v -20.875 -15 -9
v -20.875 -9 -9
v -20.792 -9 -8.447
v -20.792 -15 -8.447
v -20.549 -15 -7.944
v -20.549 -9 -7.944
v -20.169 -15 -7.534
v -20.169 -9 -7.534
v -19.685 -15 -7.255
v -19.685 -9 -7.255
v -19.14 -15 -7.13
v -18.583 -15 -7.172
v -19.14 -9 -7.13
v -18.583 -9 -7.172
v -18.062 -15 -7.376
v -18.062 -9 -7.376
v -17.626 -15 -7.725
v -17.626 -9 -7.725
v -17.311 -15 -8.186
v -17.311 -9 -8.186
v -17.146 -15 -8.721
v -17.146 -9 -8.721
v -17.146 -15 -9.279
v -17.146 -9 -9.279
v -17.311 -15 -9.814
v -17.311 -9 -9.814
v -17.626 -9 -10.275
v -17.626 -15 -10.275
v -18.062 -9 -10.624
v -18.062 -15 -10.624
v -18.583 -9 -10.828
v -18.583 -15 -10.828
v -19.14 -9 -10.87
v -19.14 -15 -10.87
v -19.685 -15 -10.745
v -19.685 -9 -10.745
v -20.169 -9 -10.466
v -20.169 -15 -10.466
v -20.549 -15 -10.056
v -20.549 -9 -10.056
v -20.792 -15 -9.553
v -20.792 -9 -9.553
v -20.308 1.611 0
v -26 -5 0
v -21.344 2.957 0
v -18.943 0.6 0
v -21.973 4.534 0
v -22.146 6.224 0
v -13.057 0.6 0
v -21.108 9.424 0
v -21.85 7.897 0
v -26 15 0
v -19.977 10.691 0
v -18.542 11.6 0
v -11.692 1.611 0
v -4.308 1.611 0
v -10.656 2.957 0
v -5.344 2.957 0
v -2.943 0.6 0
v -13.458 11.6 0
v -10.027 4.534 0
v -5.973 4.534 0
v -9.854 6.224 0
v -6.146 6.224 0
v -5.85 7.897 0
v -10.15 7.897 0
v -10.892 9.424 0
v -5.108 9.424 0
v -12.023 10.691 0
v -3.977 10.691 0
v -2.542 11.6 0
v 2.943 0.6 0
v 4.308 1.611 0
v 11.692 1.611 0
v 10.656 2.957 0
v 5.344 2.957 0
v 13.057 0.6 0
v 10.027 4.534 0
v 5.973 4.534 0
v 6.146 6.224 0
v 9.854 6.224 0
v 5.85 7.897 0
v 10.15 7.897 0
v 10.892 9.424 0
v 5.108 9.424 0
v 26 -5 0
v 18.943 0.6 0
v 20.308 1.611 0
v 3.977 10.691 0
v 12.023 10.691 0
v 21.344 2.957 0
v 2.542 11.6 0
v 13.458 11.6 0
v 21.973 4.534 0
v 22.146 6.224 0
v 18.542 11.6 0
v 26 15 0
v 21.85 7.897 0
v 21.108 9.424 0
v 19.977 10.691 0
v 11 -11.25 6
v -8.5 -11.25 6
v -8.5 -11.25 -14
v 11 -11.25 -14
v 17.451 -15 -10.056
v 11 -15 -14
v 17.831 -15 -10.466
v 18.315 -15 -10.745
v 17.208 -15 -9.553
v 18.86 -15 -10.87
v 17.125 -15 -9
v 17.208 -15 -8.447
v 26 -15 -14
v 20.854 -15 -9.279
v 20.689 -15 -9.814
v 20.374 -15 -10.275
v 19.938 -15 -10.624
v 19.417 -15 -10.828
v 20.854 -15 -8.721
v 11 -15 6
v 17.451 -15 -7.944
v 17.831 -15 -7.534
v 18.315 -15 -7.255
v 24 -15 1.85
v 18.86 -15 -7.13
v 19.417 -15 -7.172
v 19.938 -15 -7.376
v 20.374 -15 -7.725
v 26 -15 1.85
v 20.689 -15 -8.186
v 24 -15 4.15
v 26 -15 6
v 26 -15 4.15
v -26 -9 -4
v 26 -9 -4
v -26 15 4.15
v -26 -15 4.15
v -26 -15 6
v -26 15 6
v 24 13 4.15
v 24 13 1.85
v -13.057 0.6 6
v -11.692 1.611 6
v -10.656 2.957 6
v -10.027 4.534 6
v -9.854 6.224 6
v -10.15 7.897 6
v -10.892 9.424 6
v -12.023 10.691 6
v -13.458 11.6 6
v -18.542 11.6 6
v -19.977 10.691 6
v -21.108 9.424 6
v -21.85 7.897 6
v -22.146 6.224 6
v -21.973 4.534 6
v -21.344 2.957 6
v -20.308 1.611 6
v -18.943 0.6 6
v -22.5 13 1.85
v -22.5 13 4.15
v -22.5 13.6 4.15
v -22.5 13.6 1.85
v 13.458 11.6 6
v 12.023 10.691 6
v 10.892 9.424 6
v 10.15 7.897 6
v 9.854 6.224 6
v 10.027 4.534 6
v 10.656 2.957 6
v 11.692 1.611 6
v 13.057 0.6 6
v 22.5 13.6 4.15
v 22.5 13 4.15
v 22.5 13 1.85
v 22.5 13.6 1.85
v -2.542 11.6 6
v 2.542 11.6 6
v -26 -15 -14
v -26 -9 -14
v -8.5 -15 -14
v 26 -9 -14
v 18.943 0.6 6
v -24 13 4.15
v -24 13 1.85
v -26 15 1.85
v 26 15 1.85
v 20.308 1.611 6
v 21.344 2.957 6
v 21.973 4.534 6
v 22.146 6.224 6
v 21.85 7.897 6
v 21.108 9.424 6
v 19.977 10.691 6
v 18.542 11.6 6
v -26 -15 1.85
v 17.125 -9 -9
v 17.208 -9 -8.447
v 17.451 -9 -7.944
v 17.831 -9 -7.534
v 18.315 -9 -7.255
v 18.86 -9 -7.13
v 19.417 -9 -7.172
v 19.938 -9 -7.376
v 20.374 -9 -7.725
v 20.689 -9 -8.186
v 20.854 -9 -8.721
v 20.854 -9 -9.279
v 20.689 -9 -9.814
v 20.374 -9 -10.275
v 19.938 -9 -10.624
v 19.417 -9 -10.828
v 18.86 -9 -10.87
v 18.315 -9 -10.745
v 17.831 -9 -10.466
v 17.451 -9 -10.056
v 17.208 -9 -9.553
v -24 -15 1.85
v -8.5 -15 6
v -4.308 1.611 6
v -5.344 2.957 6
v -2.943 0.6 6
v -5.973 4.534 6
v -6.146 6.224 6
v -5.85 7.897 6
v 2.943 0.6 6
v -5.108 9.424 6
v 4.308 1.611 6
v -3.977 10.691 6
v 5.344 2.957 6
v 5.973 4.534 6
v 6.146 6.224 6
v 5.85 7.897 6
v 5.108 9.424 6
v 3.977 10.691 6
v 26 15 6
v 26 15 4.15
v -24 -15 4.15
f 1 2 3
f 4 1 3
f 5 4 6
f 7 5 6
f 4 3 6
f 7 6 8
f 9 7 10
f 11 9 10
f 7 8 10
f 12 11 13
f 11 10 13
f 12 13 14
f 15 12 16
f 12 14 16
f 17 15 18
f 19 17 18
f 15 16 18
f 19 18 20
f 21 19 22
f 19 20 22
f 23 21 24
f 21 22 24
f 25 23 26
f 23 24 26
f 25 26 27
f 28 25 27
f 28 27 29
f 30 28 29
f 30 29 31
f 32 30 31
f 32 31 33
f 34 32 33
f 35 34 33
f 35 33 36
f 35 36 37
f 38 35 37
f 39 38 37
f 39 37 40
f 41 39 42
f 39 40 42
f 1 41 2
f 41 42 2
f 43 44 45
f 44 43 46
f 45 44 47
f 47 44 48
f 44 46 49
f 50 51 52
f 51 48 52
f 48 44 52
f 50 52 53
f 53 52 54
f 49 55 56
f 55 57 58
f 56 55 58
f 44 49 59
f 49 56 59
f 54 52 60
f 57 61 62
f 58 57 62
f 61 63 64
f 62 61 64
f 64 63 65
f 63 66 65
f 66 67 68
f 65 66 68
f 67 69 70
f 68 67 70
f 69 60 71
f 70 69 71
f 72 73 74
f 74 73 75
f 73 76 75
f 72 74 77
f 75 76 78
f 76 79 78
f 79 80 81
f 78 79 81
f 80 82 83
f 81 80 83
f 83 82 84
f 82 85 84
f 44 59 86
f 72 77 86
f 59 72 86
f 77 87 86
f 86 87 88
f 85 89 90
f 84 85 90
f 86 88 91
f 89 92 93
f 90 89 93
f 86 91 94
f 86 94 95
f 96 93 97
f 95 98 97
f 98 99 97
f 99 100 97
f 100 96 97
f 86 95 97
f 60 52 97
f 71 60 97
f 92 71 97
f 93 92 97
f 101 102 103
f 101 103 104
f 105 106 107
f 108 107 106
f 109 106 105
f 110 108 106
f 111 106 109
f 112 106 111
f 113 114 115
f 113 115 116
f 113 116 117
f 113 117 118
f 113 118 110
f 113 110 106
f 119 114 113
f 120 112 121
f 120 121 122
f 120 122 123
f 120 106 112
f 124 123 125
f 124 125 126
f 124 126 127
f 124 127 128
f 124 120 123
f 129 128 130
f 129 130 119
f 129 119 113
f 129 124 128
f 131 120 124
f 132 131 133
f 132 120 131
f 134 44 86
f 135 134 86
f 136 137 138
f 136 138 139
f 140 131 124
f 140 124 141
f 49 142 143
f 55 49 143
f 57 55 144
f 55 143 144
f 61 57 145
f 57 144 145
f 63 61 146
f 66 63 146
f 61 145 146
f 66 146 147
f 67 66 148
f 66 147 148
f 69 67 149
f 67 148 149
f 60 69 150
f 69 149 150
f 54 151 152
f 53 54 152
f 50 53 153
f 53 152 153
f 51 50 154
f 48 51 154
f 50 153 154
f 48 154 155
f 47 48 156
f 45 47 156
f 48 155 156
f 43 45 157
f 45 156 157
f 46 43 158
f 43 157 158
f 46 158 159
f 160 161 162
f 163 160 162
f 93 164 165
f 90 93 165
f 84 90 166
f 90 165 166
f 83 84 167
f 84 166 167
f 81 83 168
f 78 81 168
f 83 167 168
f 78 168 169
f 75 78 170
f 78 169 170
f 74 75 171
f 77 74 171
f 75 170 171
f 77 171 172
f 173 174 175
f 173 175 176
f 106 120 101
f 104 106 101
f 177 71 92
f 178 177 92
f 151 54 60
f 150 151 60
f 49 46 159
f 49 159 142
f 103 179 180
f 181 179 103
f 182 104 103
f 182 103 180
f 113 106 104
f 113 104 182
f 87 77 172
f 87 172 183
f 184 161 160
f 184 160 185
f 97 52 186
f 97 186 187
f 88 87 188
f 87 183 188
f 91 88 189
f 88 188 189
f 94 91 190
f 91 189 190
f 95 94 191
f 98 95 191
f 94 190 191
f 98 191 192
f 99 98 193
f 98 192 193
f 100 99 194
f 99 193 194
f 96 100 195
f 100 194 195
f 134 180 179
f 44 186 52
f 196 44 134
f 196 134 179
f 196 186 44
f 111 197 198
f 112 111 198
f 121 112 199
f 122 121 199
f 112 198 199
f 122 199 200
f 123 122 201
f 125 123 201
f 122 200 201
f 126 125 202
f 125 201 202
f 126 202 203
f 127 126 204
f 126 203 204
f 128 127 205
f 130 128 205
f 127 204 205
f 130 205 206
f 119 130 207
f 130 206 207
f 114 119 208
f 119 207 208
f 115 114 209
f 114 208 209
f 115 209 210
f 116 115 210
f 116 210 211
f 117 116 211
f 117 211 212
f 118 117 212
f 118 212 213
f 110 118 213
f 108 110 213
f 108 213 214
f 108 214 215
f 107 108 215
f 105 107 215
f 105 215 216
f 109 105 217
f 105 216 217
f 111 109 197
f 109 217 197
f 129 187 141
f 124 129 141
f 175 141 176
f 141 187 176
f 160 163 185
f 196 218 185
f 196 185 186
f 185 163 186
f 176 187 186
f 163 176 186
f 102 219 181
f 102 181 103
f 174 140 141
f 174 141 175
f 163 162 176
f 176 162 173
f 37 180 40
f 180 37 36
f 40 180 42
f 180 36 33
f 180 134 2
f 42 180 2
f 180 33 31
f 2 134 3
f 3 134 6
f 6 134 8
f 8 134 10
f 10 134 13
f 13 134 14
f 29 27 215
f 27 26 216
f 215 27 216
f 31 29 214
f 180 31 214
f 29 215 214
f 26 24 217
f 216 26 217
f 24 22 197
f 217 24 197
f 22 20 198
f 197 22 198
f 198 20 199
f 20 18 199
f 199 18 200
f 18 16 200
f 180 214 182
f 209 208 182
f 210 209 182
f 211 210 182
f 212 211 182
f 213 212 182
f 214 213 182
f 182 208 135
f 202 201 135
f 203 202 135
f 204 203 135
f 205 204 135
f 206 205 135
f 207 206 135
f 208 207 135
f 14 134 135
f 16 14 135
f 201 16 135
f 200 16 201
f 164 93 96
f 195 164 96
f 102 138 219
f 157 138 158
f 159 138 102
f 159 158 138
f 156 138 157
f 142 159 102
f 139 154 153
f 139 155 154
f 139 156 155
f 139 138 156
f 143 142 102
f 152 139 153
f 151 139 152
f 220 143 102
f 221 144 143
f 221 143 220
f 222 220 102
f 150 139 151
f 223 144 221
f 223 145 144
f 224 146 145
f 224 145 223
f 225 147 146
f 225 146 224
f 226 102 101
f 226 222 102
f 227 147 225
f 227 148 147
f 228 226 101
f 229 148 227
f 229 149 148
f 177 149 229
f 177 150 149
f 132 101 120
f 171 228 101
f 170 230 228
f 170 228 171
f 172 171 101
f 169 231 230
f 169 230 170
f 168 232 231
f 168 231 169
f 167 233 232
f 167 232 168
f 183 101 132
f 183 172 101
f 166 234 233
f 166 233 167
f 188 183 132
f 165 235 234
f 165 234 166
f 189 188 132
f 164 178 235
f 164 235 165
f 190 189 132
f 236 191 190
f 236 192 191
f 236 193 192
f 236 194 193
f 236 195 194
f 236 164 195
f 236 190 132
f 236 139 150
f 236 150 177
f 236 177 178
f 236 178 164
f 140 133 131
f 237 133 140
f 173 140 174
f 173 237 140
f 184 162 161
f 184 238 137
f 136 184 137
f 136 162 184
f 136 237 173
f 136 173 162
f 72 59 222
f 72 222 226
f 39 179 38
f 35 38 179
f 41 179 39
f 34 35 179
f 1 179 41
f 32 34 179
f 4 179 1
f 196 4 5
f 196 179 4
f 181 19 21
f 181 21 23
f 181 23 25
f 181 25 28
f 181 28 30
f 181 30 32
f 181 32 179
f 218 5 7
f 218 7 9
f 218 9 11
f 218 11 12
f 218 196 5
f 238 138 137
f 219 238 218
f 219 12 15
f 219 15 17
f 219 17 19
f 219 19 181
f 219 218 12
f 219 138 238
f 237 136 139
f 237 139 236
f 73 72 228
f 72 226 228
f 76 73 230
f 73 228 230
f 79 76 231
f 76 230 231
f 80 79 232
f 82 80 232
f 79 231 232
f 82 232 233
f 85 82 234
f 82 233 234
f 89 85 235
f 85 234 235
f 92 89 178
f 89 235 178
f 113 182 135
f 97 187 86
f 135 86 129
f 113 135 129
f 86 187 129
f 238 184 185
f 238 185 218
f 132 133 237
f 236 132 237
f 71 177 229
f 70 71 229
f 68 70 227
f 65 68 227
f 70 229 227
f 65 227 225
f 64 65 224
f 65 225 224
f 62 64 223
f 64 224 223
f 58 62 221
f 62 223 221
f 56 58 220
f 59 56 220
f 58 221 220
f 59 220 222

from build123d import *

# Parameters (mm, degrees)
SKETCH_W        = 52
SKETCH_H        = 30
PAD_DEPTH       = 6
SKETCH001_R     = 6.15
POCKET_DEPTH    = 6
SKETCH002_W     = 30
SKETCH002_H     = 2.3
POCKET001_DEPTH = 2
SKETCH003_W     = 52
SKETCH003_H     = 2.3
POCKET002_DEPTH = 2
SKETCH004_W     = 30
SKETCH004_H     = 2.3
POCKET003_DEPTH = 2
SKETCH005_W     = 52
SKETCH005_H     = 6
PAD001_DEPTH    = 14
SKETCH006_W     = 19.5
SKETCH006_H     = 3.75
POCKET004_DEPTH = 26
CHAMFER_SIZE    = 4
SKETCH007_W     = 45
SKETCH007_H     = 2
PAD002_DEPTH    = 6
SKETCH008_R     = 1.875
POCKET005_DEPTH = 6


with BuildPart() as part:
    # Sketch → Pad (new body)
    with BuildSketch(Plane.XY):
        Rectangle(SKETCH_W, SKETCH_H)
    extrude(amount=PAD_DEPTH)

    # Sketch001 (on Face6 of Pad) → Pocket (cut)
    with BuildSketch(Plane.XY.offset(6)):
        with Locations((-16, 6)):
            Circle(SKETCH001_R)
        with Locations((0, 6)):
            Circle(SKETCH001_R)
        with Locations((16, 6)):
            Circle(SKETCH001_R)
    extrude(amount=-POCKET_DEPTH, mode=Mode.SUBTRACT)

    # Sketch002 (on Face3 of Pocket) → Pocket001 (cut)
    with BuildSketch(Plane.YZ.offset(26)):
        with Locations((0, 3)):
            Rectangle(SKETCH002_W, SKETCH002_H)
    extrude(amount=-POCKET001_DEPTH, mode=Mode.SUBTRACT)

    # Sketch003 (on Face1 of Pocket001) → Pocket002 (cut)
    with BuildSketch(Plane(origin=(0, 15, 0), x_dir=(-1, 0, 0), z_dir=(0, 1, 0))):
        with Locations((0, 3)):
            Rectangle(SKETCH003_W, SKETCH003_H)
    extrude(amount=-POCKET002_DEPTH, mode=Mode.SUBTRACT)

    # Sketch004 (on Face6 of Pocket002) → Pocket003 (cut)
    with BuildSketch(Plane(origin=(-26, 0, 0), x_dir=(0, -1, 0), z_dir=(-1, 0, 0))):
        with Locations((0, 3)):
            Rectangle(SKETCH004_W, SKETCH004_H)
    extrude(amount=-POCKET003_DEPTH, mode=Mode.SUBTRACT)

    # Sketch005 (on Face2 of Pocket003) → Pad001 (join)
    with BuildSketch(Plane(origin=(0, 0, 0), x_dir=(1, 0, 0), z_dir=(0, 0, -1))):
        with Locations((0, 12)):
            Rectangle(SKETCH005_W, SKETCH005_H)
    extrude(amount=PAD001_DEPTH)

    # Sketch006 (on Face19 of Pad001) → Pocket004 (cut)
    with BuildSketch(Plane.XY.offset(6)):
        with Locations((1.25, -13.125)):
            Rectangle(SKETCH006_W, SKETCH006_H)
    extrude(amount=-POCKET004_DEPTH, mode=Mode.SUBTRACT)

    # Chamfer
    chamfer_edges = [part.edges().sort_by_distance(p)[0] for p in [
        (0, -9, 0),
    ]]
    chamfer(chamfer_edges, length=CHAMFER_SIZE)

    # Sketch007 (on Face19 of Chamfer) → Pad002 (join)
    with BuildSketch(Plane.XY.offset(6)):
        with Locations((0, -0.4)):
            Rectangle(SKETCH007_W, SKETCH007_H)
        with Locations((0, 12.6)):
            Rectangle(SKETCH007_W, SKETCH007_H)
    extrude(amount=-PAD002_DEPTH)

    # Sketch008 (on Face16 of Pad002) → Pocket005 (cut)
    with BuildSketch(Plane(origin=(0, -9, 0), x_dir=(-1, 0, 0), z_dir=(0, 1, 0))):
        with Locations((-19, -9)):
            Circle(SKETCH008_R)
        with Locations((19, -9)):
            Circle(SKETCH008_R)
    extrude(amount=-POCKET005_DEPTH, mode=Mode.SUBTRACT)


solid = part.part
